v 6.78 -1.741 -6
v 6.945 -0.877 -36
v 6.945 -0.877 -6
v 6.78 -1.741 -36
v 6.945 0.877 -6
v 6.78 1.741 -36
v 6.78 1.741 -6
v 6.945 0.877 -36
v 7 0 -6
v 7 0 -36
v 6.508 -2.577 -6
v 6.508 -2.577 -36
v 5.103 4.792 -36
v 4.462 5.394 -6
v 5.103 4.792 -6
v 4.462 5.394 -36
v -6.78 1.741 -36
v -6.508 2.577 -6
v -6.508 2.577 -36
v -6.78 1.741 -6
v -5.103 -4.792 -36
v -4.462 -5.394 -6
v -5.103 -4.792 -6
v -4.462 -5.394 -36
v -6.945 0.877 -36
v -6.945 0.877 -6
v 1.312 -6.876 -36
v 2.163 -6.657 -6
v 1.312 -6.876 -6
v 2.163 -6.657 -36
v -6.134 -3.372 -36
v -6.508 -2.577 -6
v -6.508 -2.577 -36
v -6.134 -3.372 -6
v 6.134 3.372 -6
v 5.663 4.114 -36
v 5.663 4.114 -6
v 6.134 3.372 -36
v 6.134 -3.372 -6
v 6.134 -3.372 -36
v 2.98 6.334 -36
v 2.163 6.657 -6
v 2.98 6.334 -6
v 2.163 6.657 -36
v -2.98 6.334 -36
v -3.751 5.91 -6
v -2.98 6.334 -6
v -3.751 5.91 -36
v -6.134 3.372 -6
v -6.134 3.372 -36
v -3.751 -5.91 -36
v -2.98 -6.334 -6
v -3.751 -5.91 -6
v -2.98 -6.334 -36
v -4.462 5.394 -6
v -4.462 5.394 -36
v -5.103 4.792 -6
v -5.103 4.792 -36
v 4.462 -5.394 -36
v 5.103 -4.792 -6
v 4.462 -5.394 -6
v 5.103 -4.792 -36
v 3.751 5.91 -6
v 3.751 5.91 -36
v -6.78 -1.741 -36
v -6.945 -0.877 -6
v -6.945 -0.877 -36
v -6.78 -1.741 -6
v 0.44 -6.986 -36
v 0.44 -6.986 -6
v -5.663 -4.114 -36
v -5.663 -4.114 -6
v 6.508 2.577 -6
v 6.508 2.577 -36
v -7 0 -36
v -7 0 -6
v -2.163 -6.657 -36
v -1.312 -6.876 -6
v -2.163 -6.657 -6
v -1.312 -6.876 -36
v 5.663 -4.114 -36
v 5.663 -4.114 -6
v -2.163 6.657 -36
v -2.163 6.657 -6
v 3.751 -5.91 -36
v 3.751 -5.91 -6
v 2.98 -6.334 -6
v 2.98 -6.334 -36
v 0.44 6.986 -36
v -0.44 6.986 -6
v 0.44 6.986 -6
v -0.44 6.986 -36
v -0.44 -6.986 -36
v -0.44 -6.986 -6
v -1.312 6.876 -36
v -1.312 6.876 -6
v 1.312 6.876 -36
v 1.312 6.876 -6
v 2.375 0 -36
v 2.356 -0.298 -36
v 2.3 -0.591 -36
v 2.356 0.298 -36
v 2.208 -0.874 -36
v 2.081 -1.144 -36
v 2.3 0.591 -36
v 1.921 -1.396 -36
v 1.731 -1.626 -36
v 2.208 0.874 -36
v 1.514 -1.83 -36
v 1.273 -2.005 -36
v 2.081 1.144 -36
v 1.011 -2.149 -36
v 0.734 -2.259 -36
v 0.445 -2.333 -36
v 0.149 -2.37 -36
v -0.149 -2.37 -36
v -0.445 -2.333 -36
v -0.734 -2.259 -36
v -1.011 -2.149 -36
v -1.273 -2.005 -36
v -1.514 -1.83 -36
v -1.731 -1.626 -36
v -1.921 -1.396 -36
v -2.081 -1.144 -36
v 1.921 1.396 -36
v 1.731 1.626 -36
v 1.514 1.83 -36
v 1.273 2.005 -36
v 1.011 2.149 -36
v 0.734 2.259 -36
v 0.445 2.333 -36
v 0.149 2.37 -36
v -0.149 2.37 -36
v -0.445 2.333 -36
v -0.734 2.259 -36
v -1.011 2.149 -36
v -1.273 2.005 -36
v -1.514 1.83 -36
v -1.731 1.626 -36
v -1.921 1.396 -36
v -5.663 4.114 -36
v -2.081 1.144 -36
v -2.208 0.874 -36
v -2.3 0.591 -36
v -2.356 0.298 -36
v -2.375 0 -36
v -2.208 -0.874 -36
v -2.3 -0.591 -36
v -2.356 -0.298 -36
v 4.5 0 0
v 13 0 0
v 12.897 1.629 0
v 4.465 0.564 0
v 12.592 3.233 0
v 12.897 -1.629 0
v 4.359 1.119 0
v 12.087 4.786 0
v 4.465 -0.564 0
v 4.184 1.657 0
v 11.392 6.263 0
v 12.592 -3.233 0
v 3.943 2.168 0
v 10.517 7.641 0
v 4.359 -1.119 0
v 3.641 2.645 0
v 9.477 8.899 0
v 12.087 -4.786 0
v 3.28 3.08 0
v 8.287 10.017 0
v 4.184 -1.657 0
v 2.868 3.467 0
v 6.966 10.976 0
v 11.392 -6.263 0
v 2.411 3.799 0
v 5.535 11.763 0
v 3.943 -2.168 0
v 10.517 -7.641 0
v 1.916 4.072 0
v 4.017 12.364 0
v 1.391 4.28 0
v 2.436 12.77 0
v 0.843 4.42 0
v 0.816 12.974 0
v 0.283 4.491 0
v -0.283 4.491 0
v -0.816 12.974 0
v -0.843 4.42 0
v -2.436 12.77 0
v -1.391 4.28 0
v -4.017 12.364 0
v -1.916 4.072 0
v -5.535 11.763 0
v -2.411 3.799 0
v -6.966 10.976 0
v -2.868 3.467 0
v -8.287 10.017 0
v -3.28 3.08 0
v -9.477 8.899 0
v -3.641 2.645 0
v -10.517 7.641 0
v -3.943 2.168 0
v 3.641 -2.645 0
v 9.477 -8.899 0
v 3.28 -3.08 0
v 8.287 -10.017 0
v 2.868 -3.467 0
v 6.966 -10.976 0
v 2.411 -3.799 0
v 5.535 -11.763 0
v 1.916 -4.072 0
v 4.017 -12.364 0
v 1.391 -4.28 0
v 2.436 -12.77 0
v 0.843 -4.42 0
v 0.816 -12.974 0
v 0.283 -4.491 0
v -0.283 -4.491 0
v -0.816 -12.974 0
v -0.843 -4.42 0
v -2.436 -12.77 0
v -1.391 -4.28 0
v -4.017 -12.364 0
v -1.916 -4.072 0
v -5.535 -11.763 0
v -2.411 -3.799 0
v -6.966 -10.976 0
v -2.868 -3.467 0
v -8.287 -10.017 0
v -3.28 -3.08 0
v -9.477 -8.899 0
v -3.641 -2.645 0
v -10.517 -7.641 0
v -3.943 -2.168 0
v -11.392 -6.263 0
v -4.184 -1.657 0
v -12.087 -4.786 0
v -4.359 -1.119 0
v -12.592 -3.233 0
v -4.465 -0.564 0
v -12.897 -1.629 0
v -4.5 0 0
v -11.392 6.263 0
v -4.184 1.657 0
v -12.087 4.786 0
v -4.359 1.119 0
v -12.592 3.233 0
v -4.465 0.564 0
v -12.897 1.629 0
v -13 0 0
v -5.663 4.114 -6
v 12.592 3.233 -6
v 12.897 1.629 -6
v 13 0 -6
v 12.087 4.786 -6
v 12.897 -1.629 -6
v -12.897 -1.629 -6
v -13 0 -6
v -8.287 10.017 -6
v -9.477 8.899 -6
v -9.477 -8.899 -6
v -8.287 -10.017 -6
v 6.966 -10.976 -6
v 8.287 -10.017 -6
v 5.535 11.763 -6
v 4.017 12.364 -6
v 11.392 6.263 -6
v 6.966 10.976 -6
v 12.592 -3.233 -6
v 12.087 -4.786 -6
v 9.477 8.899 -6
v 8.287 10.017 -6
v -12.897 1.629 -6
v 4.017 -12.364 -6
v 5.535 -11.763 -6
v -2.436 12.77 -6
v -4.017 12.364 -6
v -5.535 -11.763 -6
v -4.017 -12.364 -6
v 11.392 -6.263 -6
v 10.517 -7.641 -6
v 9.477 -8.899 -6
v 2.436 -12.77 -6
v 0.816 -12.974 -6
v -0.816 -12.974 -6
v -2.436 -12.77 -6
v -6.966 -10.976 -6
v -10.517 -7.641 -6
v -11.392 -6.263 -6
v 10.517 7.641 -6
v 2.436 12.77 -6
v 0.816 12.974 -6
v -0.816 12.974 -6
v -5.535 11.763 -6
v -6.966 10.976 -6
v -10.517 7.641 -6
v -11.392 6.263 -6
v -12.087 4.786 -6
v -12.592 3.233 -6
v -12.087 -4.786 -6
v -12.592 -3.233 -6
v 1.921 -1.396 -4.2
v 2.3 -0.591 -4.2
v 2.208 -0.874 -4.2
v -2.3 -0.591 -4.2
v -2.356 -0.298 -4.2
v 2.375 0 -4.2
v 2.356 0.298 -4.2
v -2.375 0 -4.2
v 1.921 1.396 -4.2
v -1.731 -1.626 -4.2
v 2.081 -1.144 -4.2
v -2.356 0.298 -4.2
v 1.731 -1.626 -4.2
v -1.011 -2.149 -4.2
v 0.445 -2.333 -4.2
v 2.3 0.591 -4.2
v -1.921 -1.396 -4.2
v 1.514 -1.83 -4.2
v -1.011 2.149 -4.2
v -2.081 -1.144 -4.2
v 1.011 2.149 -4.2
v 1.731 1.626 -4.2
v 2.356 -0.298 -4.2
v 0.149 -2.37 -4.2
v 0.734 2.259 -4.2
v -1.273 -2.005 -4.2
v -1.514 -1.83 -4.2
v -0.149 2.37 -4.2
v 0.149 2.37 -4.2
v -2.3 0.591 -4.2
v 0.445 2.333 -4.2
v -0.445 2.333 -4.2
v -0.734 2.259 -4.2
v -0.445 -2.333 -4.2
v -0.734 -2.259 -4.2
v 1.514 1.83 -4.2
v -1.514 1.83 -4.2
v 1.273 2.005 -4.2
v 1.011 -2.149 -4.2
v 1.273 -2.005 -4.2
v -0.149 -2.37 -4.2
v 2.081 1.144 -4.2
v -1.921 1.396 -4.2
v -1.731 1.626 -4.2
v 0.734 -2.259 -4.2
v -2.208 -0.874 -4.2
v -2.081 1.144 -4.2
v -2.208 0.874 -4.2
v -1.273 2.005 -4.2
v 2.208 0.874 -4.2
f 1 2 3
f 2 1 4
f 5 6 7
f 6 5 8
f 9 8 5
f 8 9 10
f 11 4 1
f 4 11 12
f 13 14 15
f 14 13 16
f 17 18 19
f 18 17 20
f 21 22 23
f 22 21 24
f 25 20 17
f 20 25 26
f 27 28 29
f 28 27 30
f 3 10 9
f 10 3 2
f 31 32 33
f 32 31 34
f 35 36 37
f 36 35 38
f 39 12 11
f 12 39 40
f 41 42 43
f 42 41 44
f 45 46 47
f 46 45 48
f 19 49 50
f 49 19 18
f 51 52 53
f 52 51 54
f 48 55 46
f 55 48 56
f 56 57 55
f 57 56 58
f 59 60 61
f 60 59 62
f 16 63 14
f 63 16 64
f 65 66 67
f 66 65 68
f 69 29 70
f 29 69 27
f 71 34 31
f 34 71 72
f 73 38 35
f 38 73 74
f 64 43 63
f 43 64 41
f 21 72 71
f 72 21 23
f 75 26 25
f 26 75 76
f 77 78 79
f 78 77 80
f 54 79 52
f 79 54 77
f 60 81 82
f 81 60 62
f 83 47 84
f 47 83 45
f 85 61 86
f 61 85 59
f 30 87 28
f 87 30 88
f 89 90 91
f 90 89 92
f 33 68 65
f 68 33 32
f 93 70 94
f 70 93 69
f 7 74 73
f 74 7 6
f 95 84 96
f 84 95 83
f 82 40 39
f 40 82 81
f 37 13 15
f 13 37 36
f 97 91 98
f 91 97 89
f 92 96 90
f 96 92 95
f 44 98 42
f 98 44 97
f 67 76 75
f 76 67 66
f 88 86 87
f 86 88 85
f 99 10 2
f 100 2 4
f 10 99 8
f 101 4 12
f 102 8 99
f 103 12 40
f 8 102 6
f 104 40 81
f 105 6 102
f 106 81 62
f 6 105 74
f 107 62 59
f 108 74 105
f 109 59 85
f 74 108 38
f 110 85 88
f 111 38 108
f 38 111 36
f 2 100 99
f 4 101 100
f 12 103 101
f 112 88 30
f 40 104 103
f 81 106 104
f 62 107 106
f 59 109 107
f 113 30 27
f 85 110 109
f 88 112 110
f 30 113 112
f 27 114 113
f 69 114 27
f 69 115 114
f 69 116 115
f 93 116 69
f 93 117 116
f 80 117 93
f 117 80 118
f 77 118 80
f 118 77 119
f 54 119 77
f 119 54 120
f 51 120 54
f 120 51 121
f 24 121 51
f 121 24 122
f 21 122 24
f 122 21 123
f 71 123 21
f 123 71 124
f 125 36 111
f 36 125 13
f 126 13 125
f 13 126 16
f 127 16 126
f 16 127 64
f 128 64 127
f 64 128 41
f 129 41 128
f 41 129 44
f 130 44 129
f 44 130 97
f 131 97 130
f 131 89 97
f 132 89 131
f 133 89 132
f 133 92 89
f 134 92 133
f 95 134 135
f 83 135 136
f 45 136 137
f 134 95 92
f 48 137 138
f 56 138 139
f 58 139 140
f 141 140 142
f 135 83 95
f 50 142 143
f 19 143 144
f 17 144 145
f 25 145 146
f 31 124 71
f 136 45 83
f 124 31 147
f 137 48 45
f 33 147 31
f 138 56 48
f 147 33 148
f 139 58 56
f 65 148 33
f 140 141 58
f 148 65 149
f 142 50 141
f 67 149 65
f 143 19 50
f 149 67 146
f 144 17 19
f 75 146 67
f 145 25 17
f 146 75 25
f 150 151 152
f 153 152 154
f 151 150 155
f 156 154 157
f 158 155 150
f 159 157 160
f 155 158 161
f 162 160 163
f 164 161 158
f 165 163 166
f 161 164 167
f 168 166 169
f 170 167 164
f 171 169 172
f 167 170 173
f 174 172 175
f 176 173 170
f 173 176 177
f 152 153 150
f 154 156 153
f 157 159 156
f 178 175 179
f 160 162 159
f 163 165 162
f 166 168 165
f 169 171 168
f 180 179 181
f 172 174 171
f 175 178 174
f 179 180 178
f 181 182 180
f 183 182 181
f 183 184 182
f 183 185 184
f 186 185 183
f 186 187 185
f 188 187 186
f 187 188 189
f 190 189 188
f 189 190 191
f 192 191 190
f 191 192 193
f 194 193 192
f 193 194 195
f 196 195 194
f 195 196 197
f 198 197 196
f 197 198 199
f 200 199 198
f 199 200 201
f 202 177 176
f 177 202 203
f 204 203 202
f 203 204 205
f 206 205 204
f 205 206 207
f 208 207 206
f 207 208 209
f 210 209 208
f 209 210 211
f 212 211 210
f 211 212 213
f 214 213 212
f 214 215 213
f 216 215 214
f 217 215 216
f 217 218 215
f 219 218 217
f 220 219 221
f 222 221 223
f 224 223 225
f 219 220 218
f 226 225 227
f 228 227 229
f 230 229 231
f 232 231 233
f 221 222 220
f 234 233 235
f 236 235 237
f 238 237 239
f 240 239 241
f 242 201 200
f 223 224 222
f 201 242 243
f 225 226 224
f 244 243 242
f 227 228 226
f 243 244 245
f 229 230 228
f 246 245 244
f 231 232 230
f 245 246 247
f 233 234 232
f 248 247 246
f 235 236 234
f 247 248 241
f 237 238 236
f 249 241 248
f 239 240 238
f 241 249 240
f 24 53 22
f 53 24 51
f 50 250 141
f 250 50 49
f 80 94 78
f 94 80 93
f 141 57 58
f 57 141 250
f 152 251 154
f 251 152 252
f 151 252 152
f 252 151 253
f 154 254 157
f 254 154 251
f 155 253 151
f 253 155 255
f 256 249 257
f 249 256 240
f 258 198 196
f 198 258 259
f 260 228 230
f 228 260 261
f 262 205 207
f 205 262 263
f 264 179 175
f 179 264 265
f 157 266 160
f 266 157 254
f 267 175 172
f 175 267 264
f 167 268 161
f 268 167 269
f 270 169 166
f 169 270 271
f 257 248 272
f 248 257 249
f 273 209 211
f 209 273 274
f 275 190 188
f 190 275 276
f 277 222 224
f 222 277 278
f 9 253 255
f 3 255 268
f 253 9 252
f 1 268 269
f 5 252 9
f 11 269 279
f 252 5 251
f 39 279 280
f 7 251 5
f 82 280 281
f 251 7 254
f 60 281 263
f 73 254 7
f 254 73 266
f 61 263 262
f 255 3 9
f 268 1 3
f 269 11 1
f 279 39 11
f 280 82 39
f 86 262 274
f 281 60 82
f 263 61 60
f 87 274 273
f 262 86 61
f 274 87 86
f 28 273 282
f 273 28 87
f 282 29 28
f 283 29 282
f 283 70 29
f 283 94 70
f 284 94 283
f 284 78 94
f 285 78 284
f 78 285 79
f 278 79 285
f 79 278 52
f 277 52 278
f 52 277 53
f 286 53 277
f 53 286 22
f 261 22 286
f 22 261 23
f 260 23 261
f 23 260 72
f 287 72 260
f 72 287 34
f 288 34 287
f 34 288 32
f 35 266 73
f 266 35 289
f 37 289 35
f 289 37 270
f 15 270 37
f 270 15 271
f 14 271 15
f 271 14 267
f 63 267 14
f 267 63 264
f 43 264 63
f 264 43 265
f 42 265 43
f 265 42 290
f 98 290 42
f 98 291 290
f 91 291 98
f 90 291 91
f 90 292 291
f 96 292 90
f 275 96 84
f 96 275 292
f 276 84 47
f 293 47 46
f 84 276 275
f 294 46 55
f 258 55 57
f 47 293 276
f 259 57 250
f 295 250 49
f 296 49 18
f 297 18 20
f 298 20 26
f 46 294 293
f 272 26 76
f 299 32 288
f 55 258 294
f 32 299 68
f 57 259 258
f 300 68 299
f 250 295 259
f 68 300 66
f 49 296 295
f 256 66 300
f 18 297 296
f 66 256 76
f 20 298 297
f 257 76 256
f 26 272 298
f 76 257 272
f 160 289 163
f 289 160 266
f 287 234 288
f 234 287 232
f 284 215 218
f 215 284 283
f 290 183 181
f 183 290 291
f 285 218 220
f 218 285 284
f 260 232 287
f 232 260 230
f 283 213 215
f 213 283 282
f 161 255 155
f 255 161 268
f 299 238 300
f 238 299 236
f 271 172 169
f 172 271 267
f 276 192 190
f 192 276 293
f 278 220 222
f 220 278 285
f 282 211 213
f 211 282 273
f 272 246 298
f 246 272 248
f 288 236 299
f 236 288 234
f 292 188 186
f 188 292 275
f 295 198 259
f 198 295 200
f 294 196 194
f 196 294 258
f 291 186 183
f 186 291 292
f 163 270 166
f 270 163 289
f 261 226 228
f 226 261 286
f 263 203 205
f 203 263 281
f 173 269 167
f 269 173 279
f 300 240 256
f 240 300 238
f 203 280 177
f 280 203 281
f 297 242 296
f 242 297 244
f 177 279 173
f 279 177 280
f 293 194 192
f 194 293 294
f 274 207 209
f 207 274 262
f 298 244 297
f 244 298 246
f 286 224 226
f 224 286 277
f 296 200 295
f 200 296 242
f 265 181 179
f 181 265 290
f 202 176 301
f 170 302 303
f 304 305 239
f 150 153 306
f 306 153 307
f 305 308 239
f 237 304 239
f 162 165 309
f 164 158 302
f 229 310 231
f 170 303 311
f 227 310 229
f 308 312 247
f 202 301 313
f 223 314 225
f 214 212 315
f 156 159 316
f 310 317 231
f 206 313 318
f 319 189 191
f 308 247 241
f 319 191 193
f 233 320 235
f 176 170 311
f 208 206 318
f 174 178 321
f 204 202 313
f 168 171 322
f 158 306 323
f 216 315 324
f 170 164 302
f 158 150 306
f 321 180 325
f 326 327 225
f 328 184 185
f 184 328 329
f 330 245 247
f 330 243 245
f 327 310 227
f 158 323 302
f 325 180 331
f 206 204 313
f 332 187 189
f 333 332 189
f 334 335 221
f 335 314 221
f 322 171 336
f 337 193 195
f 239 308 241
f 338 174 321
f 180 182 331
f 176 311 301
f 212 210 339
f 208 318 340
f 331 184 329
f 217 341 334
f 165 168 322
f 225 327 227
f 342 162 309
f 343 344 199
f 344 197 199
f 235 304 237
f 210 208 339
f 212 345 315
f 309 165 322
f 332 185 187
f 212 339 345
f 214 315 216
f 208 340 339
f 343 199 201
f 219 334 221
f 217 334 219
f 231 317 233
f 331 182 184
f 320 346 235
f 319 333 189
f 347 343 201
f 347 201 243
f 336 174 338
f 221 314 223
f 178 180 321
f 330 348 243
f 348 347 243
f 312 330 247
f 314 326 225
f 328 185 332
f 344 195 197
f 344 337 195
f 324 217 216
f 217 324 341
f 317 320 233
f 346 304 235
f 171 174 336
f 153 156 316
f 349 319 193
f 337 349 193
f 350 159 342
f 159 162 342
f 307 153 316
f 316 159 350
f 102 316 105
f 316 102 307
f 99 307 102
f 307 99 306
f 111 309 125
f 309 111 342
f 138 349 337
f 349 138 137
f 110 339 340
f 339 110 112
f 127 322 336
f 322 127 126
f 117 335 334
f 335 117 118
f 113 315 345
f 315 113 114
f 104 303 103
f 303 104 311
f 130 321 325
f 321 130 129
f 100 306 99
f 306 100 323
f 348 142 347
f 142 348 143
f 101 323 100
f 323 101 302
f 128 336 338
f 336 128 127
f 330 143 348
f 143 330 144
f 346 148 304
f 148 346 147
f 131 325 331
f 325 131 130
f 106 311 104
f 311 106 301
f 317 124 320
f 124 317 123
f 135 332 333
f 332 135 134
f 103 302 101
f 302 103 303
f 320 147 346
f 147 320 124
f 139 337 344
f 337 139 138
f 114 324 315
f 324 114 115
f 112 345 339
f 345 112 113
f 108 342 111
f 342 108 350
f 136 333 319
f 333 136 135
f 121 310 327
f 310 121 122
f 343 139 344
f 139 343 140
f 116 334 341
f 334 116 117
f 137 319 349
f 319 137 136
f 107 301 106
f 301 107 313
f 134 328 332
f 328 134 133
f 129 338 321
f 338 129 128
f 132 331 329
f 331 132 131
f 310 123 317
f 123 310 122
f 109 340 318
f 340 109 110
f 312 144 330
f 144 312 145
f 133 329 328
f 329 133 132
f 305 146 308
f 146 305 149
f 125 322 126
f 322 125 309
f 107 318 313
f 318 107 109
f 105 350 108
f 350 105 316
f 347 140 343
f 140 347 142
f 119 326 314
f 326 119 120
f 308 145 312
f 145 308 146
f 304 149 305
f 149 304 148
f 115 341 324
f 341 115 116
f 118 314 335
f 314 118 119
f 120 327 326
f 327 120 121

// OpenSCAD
$fn = 50;


difference() {
	union() {
		translate(v = [0, 0, -36.0000000000]) {
			cylinder(h = 36, r = 7.0000000000);
		}
		translate(v = [0, 0, -6.0000000000]) {
			cylinder(h = 6, r = 13.0000000000);
		}
	}
	union() {
		translate(v = [0, 0, 0]) {
			rotate(a = [0, 0, 0]) {
				difference() {
					union() {
						#translate(v = [0, 0, -36.0000000000]) {
							cylinder(h = 36, r = 2.2500000000);
						}
						#translate(v = [0, 0, -4.2000000000]) {
							cylinder(h = 4.2000000000, r1 = 2.3750000000, r2 = 4.5000000000);
						}
						#translate(v = [0, 0, -36.0000000000]) {
							cylinder(h = 36, r = 2.3750000000);
						}
						#translate(v = [0, 0, -36.0000000000]) {
							cylinder(h = 36, r = 2.2500000000);
						}
					}
					union();
				}
			}
		}
	}
}
